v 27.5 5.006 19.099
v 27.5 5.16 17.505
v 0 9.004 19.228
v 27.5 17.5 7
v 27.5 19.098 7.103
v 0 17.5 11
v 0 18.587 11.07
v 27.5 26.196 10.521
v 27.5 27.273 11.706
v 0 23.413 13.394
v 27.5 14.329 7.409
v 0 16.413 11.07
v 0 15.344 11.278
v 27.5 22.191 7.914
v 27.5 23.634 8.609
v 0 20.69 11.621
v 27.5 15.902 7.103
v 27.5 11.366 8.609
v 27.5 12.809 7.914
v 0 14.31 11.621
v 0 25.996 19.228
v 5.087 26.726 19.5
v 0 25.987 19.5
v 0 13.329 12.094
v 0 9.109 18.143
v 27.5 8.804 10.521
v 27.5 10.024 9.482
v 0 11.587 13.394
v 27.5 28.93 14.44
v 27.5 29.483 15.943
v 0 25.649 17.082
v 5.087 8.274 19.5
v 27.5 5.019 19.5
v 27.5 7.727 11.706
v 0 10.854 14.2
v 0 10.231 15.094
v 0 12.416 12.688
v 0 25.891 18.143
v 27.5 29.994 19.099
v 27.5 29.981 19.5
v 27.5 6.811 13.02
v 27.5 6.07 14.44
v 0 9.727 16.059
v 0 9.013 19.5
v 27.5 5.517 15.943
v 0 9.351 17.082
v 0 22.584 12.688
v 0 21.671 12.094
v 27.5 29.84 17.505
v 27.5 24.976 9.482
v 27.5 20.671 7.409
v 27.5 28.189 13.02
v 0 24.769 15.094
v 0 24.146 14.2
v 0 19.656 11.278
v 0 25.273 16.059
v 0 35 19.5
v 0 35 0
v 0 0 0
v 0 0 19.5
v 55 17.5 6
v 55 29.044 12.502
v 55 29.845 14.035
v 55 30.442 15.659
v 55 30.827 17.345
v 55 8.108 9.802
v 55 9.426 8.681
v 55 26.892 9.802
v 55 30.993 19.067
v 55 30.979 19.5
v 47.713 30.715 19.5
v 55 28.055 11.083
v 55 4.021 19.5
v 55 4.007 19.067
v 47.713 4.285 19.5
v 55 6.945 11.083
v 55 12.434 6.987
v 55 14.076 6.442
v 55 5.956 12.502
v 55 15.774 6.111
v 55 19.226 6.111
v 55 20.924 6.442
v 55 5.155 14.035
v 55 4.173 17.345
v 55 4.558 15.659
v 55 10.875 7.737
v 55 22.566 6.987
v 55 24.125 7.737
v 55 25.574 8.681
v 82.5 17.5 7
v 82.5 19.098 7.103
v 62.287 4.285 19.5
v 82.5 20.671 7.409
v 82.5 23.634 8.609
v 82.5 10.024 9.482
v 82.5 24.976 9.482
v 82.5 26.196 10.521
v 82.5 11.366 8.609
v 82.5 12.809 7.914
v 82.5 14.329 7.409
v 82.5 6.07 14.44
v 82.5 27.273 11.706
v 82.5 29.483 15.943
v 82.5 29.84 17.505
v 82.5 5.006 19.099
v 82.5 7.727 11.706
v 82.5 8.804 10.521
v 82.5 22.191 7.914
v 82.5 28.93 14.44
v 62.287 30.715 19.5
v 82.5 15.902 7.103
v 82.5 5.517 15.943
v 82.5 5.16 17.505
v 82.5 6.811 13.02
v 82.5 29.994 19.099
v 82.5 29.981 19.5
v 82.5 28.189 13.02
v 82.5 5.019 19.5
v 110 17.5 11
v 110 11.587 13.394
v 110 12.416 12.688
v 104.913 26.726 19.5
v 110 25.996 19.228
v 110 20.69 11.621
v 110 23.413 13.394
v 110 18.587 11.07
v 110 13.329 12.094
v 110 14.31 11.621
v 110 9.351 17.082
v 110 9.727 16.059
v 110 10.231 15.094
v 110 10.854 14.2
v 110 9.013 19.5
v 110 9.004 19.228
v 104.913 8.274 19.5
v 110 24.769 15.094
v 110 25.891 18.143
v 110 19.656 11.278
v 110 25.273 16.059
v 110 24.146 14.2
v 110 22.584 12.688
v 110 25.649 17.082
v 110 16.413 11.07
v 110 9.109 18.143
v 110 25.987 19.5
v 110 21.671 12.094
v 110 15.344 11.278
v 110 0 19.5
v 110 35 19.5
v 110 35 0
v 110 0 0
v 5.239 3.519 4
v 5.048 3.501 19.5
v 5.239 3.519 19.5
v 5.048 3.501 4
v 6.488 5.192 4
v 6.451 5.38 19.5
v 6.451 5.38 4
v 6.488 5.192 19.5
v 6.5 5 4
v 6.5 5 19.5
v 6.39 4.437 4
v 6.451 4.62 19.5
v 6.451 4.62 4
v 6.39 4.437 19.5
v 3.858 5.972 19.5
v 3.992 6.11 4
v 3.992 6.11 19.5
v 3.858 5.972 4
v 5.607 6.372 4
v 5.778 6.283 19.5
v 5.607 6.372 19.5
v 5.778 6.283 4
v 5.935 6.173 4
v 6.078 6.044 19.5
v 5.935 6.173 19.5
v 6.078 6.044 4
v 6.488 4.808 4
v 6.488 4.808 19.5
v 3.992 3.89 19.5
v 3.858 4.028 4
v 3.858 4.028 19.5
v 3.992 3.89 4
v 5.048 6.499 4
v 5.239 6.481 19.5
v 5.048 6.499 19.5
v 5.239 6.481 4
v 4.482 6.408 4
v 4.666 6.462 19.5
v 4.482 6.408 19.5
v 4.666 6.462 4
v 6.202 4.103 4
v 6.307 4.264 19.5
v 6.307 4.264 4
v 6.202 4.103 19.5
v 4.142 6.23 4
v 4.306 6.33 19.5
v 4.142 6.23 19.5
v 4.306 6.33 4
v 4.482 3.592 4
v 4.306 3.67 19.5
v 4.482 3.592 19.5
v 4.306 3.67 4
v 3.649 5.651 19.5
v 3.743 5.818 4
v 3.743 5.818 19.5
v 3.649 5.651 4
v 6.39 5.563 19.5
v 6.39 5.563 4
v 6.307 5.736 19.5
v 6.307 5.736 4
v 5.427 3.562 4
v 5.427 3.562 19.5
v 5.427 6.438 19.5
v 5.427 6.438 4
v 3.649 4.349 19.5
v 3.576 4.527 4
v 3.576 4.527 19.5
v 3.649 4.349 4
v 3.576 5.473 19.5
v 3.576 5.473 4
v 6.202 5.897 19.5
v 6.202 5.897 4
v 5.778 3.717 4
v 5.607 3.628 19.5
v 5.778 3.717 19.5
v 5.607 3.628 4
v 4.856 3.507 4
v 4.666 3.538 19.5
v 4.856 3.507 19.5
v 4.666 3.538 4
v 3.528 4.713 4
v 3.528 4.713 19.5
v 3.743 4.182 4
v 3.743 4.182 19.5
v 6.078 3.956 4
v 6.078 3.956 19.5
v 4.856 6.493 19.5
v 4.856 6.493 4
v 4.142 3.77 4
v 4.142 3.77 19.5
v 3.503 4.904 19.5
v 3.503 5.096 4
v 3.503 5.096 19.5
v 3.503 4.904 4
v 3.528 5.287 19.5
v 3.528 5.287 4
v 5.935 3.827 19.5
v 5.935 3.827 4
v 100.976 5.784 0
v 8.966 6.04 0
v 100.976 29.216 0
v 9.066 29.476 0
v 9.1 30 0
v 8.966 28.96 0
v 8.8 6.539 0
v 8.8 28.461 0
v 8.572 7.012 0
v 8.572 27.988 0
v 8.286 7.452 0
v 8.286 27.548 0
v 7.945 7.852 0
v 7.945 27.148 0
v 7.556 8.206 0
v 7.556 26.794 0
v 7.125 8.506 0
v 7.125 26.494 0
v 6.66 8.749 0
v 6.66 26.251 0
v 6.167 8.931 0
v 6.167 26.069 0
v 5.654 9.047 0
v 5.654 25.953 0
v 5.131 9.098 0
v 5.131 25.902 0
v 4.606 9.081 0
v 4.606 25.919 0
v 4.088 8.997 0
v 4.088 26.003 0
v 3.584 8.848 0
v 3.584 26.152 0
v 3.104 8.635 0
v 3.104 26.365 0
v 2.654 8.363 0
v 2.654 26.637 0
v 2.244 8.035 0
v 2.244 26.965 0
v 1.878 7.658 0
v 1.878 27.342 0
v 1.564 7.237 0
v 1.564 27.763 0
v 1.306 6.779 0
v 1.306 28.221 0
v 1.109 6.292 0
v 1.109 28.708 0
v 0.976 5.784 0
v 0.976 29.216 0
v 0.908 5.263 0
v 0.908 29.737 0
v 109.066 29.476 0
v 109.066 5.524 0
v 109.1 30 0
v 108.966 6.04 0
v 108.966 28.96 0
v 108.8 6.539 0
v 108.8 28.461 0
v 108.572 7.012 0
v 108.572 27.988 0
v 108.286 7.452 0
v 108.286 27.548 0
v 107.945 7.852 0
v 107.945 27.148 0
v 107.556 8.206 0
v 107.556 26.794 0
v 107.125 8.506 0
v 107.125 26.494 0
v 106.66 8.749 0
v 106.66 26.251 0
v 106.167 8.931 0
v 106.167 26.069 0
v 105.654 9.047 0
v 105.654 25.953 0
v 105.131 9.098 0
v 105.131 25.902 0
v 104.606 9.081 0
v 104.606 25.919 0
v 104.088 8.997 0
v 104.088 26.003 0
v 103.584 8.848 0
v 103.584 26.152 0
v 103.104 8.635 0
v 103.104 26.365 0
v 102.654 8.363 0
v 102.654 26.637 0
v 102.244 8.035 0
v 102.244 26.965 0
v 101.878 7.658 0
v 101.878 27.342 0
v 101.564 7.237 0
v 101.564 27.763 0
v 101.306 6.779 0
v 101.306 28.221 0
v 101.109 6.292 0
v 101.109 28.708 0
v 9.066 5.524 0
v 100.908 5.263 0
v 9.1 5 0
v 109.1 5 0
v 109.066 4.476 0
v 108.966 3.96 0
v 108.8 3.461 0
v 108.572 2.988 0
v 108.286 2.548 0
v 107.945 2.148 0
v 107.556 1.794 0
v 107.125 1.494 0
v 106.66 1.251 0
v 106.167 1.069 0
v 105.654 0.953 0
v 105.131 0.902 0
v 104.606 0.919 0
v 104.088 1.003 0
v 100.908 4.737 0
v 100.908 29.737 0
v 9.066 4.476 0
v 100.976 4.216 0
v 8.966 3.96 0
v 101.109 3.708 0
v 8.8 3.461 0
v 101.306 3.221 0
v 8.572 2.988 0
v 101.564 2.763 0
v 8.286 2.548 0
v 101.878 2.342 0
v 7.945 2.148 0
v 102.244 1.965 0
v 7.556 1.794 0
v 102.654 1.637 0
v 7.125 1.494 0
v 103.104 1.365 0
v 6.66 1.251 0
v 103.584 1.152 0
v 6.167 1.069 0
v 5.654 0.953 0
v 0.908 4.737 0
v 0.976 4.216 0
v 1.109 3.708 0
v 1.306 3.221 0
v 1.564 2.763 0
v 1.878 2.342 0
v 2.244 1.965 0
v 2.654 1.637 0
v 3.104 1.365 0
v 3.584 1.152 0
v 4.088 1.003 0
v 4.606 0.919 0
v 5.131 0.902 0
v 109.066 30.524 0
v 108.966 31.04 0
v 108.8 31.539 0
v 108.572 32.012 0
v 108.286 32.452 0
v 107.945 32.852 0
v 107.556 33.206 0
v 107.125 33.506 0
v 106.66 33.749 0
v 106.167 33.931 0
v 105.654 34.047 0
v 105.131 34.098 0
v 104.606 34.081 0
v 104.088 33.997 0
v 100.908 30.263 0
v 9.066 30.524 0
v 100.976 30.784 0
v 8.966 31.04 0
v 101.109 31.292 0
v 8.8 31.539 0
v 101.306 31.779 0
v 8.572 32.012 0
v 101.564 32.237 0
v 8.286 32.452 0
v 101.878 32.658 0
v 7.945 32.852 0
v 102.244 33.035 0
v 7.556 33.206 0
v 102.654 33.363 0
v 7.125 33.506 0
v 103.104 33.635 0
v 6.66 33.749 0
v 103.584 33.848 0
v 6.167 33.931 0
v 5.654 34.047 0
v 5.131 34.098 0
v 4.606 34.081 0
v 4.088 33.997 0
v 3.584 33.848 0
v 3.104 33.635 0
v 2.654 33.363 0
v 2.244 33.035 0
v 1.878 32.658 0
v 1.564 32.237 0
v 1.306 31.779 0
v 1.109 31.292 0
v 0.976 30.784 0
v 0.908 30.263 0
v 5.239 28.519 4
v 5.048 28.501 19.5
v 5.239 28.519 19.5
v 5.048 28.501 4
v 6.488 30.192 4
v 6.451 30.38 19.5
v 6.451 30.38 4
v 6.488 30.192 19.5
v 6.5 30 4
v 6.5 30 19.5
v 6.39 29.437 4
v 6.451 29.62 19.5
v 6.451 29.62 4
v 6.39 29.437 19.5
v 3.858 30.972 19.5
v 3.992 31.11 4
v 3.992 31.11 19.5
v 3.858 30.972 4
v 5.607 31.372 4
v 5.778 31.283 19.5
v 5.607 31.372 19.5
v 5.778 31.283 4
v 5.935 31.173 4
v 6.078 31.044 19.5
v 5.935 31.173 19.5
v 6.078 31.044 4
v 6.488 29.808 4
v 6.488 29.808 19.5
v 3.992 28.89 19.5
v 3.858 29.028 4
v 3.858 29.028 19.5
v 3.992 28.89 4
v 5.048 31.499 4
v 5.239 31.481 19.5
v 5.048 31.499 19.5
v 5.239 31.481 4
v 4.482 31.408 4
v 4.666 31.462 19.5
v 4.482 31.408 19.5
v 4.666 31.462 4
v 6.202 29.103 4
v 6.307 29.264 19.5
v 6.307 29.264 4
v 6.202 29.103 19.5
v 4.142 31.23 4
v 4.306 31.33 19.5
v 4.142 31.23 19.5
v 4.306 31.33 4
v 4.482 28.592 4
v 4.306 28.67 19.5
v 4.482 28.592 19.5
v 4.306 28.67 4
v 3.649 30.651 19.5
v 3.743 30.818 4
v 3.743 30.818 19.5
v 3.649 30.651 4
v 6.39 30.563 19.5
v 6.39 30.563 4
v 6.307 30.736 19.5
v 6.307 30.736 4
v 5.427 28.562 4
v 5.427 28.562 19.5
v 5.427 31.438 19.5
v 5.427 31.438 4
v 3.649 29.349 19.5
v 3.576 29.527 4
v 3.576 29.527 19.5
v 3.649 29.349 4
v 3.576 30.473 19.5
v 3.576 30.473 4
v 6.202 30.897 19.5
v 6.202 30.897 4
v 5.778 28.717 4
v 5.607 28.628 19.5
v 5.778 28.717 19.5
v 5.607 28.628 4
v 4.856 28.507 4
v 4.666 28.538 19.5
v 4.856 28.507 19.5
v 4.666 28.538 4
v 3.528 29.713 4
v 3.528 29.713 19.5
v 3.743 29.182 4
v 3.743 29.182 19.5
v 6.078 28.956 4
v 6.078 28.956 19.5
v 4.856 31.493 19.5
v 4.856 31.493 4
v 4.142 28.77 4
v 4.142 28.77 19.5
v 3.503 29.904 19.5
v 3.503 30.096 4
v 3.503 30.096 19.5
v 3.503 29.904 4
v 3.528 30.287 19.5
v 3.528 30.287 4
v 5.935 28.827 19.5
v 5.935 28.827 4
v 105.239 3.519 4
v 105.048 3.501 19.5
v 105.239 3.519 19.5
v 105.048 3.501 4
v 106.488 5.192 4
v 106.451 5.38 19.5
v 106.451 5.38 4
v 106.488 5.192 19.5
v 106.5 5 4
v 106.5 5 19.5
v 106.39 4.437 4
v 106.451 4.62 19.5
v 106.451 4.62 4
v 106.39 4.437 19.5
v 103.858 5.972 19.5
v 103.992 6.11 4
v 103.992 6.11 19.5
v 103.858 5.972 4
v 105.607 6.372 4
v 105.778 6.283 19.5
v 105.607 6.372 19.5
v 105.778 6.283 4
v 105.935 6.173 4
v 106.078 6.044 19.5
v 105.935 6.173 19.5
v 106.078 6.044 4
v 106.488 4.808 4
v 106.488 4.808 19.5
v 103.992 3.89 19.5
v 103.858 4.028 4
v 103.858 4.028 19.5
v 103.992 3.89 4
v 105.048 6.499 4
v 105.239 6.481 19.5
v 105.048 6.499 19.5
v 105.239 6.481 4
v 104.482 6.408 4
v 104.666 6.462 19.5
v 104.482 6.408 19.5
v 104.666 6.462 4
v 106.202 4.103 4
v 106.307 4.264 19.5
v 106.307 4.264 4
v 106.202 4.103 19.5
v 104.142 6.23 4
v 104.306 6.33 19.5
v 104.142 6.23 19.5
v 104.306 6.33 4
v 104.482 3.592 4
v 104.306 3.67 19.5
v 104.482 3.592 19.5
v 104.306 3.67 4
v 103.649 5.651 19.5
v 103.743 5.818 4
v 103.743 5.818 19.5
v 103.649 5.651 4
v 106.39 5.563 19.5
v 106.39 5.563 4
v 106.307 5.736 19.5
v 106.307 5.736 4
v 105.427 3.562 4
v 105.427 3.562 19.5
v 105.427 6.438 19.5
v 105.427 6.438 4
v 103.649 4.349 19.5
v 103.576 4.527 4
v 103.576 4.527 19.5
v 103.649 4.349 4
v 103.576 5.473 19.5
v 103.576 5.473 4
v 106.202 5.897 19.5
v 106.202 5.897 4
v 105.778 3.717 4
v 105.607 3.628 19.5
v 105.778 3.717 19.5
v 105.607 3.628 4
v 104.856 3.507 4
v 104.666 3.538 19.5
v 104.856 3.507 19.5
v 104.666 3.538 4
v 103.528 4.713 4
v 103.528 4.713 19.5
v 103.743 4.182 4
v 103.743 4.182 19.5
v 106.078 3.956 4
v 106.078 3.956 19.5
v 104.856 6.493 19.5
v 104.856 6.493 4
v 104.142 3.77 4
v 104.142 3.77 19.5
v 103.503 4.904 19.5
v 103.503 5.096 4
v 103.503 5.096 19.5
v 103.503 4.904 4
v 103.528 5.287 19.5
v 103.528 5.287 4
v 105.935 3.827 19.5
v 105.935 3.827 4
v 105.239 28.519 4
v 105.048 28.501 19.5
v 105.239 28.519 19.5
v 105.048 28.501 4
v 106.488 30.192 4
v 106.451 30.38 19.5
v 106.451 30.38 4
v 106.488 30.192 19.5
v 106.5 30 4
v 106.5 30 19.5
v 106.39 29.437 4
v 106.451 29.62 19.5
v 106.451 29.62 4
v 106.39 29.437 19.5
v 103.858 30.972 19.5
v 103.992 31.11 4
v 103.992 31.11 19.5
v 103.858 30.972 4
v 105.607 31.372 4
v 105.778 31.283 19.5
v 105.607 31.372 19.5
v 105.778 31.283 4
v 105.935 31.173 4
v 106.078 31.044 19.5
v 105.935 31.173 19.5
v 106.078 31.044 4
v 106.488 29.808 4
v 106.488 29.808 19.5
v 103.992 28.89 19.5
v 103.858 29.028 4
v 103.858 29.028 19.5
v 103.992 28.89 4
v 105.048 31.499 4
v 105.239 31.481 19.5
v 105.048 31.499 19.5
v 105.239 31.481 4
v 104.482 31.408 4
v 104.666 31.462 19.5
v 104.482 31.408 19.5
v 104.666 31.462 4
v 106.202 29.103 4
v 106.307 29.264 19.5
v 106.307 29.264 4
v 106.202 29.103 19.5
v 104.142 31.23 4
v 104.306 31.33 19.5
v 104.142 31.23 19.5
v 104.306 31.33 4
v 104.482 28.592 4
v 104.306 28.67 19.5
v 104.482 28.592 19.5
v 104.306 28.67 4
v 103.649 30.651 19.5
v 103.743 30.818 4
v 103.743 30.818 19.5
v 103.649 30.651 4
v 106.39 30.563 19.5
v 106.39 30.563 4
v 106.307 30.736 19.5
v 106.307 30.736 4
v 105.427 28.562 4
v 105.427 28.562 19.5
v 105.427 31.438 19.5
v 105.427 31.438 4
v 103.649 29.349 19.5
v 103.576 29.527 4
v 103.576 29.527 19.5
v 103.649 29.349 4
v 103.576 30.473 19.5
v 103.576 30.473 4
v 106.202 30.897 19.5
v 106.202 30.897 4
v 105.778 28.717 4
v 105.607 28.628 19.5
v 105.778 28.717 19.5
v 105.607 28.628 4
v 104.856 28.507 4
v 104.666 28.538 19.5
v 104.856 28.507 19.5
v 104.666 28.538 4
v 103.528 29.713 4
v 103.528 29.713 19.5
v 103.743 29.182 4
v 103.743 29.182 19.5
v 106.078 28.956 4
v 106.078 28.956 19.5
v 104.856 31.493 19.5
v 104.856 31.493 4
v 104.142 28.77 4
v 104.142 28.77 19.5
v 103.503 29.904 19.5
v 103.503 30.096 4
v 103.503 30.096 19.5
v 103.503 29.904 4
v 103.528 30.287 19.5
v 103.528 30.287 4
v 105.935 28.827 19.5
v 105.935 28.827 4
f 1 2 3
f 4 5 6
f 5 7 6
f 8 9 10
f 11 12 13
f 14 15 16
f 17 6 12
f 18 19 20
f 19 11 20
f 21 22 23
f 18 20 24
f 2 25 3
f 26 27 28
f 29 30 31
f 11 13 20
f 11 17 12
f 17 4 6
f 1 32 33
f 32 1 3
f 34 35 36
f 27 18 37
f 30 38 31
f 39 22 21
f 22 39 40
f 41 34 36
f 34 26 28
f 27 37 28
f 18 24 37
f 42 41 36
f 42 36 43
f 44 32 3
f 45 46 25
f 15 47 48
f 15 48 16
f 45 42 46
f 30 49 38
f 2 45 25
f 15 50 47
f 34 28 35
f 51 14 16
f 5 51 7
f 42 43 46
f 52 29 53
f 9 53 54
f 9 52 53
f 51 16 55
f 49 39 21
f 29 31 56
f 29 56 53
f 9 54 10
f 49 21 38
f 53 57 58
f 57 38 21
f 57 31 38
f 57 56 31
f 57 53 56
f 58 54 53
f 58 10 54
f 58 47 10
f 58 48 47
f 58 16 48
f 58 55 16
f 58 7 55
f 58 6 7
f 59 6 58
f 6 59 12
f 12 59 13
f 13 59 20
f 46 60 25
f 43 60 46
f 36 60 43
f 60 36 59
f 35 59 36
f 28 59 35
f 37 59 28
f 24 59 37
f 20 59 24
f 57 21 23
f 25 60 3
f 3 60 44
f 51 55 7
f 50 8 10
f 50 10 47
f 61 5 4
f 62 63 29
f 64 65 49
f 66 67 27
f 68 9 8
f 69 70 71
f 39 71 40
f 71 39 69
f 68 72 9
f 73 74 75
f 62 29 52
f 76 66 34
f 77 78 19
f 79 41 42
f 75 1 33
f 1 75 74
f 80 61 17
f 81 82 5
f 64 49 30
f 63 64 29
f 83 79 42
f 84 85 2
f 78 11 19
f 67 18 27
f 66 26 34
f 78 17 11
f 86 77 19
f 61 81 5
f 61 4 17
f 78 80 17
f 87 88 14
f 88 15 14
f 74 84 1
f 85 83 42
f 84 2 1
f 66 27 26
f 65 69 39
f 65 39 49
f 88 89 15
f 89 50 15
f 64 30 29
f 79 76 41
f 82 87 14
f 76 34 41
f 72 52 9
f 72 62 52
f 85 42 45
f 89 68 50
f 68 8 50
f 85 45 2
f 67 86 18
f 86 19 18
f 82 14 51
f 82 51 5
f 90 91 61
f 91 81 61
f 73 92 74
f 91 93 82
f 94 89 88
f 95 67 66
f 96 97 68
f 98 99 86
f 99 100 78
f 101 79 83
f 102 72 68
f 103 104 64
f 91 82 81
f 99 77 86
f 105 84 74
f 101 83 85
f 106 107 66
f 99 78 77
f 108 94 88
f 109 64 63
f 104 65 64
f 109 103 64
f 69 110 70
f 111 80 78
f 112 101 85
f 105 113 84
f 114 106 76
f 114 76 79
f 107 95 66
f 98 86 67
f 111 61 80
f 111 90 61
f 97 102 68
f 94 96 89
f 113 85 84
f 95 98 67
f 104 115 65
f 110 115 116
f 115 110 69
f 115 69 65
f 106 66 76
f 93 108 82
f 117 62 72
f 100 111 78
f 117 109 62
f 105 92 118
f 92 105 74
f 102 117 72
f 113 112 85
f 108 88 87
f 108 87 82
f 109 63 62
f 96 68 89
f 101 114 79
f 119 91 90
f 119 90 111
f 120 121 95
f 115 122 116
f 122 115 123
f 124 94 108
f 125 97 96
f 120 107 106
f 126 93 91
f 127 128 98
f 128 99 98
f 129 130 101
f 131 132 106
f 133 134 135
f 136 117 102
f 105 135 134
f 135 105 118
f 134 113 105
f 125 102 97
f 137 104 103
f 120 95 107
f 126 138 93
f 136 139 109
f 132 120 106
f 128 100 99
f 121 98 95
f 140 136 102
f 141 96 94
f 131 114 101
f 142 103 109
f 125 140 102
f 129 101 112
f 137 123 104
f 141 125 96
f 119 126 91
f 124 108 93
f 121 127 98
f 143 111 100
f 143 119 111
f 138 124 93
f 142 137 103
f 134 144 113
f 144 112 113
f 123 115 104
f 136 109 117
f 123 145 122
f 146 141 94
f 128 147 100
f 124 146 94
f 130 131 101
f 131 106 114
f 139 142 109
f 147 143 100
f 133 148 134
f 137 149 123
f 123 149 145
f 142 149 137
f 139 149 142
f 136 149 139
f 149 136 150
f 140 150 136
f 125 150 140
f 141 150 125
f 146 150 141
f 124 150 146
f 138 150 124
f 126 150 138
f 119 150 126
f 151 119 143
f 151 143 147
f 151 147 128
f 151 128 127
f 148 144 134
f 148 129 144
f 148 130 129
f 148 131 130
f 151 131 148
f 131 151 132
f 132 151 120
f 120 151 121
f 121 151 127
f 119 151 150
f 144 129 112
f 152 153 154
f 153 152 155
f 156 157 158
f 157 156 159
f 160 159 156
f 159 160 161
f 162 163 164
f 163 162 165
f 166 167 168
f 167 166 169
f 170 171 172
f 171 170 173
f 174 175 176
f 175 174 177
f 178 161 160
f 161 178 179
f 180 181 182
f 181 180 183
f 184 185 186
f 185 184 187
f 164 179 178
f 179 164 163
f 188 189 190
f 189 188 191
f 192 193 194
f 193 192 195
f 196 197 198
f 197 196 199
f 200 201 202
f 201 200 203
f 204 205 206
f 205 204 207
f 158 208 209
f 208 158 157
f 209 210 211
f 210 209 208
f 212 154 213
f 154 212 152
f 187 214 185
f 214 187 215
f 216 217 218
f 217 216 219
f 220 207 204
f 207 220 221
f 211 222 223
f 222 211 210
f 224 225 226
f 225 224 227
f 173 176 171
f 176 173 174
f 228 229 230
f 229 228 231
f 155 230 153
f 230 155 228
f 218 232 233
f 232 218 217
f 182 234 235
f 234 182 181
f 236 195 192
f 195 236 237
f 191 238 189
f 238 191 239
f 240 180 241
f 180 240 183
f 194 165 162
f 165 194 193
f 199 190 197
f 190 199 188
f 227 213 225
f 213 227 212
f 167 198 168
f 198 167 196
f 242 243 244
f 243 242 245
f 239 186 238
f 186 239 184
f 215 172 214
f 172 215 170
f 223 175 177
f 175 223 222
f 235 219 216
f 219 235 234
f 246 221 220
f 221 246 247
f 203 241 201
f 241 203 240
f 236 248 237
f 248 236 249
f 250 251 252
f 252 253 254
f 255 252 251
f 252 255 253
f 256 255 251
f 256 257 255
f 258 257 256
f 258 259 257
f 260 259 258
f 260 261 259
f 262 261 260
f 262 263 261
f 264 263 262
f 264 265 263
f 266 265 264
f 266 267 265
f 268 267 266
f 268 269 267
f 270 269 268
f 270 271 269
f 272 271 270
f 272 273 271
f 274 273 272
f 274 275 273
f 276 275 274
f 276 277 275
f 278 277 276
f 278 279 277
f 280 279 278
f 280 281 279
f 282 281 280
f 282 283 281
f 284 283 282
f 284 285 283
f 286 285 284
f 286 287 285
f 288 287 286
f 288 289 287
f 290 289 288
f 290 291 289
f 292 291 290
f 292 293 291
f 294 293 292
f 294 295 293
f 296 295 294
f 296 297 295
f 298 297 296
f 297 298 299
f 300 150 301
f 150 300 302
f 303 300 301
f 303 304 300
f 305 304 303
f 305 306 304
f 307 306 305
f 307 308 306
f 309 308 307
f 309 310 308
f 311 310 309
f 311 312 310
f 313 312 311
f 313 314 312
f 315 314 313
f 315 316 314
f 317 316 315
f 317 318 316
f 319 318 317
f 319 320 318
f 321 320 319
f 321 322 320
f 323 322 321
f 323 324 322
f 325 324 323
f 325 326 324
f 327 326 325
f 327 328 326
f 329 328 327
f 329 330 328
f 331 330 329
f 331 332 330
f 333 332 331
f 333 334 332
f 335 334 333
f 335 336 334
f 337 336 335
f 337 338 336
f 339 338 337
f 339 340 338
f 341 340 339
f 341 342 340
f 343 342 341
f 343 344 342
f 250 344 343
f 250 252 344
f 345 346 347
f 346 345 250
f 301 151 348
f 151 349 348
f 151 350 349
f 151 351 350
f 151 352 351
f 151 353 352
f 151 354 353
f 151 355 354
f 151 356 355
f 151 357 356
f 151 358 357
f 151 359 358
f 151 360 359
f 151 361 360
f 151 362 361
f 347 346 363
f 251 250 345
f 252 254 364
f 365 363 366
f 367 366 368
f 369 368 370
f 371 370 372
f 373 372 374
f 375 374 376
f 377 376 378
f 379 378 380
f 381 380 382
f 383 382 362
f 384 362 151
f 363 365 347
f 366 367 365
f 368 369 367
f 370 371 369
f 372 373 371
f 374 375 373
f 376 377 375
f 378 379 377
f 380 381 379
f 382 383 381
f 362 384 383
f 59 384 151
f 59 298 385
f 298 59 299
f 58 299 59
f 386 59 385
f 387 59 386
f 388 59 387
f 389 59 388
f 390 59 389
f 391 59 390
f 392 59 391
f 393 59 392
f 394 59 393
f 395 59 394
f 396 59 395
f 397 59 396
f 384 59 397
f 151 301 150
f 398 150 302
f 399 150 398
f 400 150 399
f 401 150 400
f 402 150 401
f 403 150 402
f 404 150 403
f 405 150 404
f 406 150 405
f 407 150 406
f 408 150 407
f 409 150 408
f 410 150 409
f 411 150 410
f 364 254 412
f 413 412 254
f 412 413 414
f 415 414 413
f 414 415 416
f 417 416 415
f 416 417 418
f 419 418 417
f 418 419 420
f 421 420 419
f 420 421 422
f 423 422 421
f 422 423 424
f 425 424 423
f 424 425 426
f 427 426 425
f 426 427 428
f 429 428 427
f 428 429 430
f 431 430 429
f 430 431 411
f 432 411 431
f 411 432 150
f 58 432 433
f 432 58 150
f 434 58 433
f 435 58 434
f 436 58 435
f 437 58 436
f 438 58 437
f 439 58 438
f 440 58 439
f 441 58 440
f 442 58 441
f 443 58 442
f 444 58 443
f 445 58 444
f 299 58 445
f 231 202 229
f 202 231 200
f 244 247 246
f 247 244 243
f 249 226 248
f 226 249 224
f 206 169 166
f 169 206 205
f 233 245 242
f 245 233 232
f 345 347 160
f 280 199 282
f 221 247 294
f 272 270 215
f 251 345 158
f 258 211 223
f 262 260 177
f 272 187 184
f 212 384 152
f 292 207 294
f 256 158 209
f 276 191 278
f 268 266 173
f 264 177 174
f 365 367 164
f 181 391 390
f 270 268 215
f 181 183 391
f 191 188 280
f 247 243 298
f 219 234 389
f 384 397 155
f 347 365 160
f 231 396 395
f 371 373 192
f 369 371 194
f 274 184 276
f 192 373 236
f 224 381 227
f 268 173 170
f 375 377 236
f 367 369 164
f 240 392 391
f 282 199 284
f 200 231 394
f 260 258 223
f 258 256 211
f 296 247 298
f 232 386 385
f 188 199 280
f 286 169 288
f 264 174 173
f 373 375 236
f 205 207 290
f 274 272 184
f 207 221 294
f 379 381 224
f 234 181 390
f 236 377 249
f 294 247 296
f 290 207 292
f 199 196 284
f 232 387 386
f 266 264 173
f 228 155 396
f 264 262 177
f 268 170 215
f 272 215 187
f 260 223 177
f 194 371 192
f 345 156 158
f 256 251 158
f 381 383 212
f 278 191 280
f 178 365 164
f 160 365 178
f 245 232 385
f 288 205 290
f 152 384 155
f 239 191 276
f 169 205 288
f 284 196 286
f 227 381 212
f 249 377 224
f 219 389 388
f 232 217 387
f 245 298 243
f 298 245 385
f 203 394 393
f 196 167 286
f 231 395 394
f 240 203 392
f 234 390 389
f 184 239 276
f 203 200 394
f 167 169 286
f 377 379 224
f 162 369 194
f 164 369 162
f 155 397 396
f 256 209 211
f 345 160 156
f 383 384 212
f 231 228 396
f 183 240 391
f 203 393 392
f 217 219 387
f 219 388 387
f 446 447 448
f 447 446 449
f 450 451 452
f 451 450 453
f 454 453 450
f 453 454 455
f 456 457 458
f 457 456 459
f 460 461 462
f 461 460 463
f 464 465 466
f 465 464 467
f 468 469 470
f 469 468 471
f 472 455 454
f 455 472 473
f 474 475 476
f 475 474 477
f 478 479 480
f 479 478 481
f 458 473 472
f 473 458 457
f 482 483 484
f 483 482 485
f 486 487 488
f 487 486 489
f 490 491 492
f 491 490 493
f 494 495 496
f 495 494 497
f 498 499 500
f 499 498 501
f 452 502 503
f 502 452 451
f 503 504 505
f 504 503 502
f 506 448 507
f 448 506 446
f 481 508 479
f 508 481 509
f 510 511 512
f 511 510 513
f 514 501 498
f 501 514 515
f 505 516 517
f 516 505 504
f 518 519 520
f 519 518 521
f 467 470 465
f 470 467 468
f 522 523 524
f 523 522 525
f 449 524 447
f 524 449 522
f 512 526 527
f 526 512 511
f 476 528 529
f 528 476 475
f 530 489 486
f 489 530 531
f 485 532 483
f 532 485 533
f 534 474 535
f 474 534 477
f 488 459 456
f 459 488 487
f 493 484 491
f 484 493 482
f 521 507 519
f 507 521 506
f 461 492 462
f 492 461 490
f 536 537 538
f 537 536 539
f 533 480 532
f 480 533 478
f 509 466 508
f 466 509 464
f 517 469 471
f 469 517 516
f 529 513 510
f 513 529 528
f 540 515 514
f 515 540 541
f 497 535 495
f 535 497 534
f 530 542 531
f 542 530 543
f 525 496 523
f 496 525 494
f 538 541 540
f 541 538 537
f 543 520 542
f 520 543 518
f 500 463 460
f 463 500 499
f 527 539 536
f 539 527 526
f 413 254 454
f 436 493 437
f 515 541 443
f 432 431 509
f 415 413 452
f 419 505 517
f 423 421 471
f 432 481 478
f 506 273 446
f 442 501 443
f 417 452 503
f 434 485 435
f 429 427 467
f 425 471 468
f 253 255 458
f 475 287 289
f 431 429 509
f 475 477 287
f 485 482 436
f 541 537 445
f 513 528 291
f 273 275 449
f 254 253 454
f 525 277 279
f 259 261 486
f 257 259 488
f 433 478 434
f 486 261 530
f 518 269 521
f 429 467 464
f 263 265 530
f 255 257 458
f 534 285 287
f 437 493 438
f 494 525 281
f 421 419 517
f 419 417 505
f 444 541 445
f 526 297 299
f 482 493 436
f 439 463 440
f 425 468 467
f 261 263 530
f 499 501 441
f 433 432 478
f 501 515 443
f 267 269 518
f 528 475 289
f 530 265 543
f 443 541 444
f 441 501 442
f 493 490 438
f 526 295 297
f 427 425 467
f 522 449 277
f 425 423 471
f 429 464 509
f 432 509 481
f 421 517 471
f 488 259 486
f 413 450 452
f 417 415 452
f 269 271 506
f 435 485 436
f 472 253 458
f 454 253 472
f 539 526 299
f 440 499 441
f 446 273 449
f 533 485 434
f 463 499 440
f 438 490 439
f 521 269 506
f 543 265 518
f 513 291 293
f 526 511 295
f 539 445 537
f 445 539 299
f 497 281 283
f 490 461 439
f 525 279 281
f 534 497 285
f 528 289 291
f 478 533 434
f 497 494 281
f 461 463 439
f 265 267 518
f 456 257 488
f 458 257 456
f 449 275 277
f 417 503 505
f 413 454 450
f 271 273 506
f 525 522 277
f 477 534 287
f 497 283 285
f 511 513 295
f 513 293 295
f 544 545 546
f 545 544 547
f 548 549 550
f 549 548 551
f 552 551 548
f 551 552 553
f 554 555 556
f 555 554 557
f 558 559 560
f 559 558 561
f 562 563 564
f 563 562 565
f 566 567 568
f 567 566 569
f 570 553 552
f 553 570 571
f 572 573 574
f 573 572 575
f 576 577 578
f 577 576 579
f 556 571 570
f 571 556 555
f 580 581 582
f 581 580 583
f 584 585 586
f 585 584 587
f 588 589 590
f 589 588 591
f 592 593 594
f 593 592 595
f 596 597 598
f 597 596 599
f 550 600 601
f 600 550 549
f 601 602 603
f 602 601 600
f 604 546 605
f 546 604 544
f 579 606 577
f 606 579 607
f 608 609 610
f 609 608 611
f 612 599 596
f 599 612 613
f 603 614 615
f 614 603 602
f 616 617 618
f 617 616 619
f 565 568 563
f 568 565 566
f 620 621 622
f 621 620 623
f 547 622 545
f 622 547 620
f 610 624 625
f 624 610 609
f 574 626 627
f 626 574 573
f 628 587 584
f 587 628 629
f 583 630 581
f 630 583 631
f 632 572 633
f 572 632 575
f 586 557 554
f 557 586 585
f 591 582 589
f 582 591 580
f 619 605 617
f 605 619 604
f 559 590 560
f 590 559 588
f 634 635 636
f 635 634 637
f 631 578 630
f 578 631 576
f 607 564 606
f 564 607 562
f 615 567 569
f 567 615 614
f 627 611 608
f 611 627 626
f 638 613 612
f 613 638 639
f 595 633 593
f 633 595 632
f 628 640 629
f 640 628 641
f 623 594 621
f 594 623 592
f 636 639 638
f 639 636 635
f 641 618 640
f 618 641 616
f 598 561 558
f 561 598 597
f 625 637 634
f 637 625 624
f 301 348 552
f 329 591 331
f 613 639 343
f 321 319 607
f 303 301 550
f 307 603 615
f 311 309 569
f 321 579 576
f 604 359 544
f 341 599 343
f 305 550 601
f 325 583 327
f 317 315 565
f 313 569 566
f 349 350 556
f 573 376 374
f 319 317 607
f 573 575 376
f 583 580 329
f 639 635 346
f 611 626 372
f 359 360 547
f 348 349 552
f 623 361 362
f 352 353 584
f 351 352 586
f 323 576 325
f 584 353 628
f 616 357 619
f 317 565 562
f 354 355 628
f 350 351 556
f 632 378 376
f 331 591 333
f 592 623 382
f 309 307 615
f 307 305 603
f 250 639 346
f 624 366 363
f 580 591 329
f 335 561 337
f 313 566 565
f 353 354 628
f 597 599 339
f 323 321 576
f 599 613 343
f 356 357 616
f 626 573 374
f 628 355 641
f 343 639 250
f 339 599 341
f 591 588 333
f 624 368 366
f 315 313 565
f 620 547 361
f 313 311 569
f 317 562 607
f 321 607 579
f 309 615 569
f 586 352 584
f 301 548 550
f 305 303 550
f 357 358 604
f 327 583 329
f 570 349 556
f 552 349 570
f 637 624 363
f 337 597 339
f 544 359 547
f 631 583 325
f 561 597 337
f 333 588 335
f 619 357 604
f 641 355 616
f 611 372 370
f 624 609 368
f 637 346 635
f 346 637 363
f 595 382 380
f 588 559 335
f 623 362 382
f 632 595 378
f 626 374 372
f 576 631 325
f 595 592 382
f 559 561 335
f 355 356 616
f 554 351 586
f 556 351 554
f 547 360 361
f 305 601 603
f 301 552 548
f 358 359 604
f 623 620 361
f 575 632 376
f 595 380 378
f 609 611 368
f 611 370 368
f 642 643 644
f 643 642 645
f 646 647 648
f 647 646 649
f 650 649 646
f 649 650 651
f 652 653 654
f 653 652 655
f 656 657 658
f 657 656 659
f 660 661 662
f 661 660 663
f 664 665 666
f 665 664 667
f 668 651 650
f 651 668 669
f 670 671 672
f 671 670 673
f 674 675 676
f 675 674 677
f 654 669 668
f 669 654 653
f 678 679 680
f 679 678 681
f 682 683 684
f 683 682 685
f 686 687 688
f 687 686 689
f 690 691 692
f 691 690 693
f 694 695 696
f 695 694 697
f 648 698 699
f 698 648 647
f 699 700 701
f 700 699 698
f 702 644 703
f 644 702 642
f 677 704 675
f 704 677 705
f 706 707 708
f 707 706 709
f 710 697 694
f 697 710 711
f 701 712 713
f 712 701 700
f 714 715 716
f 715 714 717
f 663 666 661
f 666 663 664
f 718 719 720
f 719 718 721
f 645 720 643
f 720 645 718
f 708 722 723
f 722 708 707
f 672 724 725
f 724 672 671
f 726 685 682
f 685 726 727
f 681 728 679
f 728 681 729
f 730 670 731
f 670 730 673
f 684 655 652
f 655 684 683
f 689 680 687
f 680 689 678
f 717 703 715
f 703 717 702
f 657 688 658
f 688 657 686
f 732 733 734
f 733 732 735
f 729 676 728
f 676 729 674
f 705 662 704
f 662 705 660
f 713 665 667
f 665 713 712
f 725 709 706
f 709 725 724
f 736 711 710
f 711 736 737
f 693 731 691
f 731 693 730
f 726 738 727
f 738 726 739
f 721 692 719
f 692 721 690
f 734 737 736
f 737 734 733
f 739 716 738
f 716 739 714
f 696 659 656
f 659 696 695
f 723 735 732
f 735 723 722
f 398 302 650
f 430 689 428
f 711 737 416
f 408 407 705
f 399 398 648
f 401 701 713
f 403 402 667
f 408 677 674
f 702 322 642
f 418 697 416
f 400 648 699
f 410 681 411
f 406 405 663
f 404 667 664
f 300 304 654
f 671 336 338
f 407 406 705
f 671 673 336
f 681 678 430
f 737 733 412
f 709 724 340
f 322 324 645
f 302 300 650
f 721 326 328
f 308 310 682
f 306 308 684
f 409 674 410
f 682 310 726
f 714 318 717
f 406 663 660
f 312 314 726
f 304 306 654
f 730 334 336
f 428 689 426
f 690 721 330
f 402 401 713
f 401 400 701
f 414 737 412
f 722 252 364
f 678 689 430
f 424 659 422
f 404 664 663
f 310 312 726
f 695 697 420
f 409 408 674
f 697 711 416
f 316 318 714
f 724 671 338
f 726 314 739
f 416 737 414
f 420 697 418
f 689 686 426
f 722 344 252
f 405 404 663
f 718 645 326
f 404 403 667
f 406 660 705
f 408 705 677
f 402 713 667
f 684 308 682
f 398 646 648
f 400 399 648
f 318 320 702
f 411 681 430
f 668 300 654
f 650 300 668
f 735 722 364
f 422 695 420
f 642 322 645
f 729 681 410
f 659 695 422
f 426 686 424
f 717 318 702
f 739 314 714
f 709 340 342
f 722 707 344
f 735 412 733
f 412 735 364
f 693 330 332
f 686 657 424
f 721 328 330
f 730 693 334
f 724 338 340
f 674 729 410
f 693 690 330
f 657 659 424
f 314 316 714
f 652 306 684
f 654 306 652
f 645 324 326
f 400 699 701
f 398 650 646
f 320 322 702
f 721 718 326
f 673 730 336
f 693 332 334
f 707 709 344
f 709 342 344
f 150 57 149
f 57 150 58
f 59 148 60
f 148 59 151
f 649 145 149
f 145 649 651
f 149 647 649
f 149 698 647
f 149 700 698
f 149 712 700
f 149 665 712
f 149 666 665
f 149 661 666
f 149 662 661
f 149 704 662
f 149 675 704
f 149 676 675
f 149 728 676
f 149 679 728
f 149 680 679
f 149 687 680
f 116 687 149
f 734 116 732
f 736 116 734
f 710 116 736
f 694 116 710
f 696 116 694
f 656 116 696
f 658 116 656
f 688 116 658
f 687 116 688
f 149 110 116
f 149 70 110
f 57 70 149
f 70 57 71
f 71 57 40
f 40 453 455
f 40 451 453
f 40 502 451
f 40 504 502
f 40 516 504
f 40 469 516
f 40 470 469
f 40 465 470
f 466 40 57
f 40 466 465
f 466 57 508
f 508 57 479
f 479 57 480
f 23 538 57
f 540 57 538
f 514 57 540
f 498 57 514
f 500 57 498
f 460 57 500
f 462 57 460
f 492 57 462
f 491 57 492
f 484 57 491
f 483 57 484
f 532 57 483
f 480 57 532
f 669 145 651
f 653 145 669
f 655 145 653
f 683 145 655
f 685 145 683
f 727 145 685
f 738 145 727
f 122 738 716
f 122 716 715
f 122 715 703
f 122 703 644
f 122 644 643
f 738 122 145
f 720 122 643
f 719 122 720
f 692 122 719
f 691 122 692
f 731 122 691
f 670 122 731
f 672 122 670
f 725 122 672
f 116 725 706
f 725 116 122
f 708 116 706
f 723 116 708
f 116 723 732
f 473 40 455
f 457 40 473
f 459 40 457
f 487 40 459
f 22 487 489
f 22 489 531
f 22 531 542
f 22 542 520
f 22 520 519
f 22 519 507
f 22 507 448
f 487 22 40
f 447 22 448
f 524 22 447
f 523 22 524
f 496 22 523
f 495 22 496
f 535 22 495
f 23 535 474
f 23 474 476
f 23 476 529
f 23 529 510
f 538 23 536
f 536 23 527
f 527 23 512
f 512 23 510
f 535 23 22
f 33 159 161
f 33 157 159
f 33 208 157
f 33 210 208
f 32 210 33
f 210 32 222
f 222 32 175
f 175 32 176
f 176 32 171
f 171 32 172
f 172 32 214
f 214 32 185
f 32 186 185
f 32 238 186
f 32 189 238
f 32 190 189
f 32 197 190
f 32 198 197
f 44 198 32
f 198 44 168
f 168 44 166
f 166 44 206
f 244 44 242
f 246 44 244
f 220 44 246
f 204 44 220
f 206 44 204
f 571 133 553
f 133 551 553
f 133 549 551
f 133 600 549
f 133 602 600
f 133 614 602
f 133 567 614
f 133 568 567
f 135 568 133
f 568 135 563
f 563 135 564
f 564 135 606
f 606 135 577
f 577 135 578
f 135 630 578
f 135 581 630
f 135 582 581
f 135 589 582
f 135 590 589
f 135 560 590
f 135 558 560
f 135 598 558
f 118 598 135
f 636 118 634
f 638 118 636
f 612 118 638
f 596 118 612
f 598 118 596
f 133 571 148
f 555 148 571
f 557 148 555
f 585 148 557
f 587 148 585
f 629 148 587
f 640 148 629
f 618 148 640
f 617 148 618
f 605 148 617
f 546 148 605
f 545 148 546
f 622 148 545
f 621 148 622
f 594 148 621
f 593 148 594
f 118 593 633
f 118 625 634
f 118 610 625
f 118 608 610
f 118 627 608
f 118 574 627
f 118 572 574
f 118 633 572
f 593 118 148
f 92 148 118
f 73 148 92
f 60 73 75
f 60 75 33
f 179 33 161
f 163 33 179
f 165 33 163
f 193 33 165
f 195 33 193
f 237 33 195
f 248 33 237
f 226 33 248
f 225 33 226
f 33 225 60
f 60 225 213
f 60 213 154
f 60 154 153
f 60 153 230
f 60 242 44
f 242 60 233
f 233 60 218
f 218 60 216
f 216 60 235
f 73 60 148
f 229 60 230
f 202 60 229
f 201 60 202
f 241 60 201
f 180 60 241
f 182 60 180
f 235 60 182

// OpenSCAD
// file: dremel_body.scad
$fn = 49;

body_width = 35;
body_height = 31;
body_length = 110;
screew_head_diameter = 8.2;
screew_neck_diameter = 3;
screew_leg_diameter = 3;
screew_head_dilatation = 1;
screew_head_height = 3;
screew_hole_shift = 1;



module dremel_tool_body(body_width, body_height, body_length)
{
    part_length = body_length / 4;
    
    translate([0, body_width/2, body_height/2])
    rotate([0, 90,0])
    {
        translate([0,0,0*part_length])
        cylinder(d1=17, d2=25, h=part_length);
        translate([0,0,1*part_length])
        cylinder(d1=25, d2=27, h=part_length);
        translate([0,0,2*part_length])
        cylinder(d1=27, d2=25, h=part_length);
        translate([0,0,3*part_length])
        cylinder(d1=25, d2=17, h=part_length);
    }
}

module holder_body(body_width, body_height, body_length)
{    
    cube([body_length, body_width, body_height]);
}

module screew_holes(body_width, body_length)
{
    translate([5,5,0])
    screew_hole(body_height);
    translate([5,body_width-5,0])
    screew_hole(body_height);
    translate([body_length-5,5,0])
    screew_hole(body_height);
    translate([body_length-5,body_width-5,0])
    screew_hole(body_height);
}

module screew_legs(body_width)
{
    translate([5,5,0])
    screew_leg(body_width, screew_hole_shift);
    translate([5,body_width-5,0])
    screew_leg(body_width, screew_hole_shift);
    translate([body_length-5,5,0])
    screew_leg(body_width, screew_hole_shift);
    translate([body_length-5,body_width-5,0])
    screew_leg(body_width, screew_hole_shift);
}

//translate([-20,-20,0])
//screew_hole(body_height);

module screew_hole(body_height)
{
    screew_leg(body_height, screew_hole_shift);
//    cylinder(d=screew_head_diameter,h=screew_hole_shift);
    translate([0,0,0])
    cylinder(d1=screew_head_diameter,d2=screew_neck_diameter,h=screew_head_dilatation+screew_head_height);
}

module screew_leg(body_width, screew_hole_shift)
{
    cylinder(d=screew_leg_diameter,h=body_width+screew_hole_shift);
}
// main file
include<dremel_body.scad>

difference()
{
    body_bottom_part();
    
//    translate([0,0,0])
//    cube([55,100,100]);
//    translate([0,0,0])
//    cube([120,60,100]);
}

module body_bottom_part()
{
    difference()
    {
        holder_body(body_width, body_height, body_length);
        translate([0,0,4])
        dremel_tool_body(body_width, body_height, body_length);

        translate([0,0,4])
        translate([0, 0, body_height/2])
        holder_body(body_width, body_height, body_length);
        screew_holes(body_width, body_length);
    }
}
